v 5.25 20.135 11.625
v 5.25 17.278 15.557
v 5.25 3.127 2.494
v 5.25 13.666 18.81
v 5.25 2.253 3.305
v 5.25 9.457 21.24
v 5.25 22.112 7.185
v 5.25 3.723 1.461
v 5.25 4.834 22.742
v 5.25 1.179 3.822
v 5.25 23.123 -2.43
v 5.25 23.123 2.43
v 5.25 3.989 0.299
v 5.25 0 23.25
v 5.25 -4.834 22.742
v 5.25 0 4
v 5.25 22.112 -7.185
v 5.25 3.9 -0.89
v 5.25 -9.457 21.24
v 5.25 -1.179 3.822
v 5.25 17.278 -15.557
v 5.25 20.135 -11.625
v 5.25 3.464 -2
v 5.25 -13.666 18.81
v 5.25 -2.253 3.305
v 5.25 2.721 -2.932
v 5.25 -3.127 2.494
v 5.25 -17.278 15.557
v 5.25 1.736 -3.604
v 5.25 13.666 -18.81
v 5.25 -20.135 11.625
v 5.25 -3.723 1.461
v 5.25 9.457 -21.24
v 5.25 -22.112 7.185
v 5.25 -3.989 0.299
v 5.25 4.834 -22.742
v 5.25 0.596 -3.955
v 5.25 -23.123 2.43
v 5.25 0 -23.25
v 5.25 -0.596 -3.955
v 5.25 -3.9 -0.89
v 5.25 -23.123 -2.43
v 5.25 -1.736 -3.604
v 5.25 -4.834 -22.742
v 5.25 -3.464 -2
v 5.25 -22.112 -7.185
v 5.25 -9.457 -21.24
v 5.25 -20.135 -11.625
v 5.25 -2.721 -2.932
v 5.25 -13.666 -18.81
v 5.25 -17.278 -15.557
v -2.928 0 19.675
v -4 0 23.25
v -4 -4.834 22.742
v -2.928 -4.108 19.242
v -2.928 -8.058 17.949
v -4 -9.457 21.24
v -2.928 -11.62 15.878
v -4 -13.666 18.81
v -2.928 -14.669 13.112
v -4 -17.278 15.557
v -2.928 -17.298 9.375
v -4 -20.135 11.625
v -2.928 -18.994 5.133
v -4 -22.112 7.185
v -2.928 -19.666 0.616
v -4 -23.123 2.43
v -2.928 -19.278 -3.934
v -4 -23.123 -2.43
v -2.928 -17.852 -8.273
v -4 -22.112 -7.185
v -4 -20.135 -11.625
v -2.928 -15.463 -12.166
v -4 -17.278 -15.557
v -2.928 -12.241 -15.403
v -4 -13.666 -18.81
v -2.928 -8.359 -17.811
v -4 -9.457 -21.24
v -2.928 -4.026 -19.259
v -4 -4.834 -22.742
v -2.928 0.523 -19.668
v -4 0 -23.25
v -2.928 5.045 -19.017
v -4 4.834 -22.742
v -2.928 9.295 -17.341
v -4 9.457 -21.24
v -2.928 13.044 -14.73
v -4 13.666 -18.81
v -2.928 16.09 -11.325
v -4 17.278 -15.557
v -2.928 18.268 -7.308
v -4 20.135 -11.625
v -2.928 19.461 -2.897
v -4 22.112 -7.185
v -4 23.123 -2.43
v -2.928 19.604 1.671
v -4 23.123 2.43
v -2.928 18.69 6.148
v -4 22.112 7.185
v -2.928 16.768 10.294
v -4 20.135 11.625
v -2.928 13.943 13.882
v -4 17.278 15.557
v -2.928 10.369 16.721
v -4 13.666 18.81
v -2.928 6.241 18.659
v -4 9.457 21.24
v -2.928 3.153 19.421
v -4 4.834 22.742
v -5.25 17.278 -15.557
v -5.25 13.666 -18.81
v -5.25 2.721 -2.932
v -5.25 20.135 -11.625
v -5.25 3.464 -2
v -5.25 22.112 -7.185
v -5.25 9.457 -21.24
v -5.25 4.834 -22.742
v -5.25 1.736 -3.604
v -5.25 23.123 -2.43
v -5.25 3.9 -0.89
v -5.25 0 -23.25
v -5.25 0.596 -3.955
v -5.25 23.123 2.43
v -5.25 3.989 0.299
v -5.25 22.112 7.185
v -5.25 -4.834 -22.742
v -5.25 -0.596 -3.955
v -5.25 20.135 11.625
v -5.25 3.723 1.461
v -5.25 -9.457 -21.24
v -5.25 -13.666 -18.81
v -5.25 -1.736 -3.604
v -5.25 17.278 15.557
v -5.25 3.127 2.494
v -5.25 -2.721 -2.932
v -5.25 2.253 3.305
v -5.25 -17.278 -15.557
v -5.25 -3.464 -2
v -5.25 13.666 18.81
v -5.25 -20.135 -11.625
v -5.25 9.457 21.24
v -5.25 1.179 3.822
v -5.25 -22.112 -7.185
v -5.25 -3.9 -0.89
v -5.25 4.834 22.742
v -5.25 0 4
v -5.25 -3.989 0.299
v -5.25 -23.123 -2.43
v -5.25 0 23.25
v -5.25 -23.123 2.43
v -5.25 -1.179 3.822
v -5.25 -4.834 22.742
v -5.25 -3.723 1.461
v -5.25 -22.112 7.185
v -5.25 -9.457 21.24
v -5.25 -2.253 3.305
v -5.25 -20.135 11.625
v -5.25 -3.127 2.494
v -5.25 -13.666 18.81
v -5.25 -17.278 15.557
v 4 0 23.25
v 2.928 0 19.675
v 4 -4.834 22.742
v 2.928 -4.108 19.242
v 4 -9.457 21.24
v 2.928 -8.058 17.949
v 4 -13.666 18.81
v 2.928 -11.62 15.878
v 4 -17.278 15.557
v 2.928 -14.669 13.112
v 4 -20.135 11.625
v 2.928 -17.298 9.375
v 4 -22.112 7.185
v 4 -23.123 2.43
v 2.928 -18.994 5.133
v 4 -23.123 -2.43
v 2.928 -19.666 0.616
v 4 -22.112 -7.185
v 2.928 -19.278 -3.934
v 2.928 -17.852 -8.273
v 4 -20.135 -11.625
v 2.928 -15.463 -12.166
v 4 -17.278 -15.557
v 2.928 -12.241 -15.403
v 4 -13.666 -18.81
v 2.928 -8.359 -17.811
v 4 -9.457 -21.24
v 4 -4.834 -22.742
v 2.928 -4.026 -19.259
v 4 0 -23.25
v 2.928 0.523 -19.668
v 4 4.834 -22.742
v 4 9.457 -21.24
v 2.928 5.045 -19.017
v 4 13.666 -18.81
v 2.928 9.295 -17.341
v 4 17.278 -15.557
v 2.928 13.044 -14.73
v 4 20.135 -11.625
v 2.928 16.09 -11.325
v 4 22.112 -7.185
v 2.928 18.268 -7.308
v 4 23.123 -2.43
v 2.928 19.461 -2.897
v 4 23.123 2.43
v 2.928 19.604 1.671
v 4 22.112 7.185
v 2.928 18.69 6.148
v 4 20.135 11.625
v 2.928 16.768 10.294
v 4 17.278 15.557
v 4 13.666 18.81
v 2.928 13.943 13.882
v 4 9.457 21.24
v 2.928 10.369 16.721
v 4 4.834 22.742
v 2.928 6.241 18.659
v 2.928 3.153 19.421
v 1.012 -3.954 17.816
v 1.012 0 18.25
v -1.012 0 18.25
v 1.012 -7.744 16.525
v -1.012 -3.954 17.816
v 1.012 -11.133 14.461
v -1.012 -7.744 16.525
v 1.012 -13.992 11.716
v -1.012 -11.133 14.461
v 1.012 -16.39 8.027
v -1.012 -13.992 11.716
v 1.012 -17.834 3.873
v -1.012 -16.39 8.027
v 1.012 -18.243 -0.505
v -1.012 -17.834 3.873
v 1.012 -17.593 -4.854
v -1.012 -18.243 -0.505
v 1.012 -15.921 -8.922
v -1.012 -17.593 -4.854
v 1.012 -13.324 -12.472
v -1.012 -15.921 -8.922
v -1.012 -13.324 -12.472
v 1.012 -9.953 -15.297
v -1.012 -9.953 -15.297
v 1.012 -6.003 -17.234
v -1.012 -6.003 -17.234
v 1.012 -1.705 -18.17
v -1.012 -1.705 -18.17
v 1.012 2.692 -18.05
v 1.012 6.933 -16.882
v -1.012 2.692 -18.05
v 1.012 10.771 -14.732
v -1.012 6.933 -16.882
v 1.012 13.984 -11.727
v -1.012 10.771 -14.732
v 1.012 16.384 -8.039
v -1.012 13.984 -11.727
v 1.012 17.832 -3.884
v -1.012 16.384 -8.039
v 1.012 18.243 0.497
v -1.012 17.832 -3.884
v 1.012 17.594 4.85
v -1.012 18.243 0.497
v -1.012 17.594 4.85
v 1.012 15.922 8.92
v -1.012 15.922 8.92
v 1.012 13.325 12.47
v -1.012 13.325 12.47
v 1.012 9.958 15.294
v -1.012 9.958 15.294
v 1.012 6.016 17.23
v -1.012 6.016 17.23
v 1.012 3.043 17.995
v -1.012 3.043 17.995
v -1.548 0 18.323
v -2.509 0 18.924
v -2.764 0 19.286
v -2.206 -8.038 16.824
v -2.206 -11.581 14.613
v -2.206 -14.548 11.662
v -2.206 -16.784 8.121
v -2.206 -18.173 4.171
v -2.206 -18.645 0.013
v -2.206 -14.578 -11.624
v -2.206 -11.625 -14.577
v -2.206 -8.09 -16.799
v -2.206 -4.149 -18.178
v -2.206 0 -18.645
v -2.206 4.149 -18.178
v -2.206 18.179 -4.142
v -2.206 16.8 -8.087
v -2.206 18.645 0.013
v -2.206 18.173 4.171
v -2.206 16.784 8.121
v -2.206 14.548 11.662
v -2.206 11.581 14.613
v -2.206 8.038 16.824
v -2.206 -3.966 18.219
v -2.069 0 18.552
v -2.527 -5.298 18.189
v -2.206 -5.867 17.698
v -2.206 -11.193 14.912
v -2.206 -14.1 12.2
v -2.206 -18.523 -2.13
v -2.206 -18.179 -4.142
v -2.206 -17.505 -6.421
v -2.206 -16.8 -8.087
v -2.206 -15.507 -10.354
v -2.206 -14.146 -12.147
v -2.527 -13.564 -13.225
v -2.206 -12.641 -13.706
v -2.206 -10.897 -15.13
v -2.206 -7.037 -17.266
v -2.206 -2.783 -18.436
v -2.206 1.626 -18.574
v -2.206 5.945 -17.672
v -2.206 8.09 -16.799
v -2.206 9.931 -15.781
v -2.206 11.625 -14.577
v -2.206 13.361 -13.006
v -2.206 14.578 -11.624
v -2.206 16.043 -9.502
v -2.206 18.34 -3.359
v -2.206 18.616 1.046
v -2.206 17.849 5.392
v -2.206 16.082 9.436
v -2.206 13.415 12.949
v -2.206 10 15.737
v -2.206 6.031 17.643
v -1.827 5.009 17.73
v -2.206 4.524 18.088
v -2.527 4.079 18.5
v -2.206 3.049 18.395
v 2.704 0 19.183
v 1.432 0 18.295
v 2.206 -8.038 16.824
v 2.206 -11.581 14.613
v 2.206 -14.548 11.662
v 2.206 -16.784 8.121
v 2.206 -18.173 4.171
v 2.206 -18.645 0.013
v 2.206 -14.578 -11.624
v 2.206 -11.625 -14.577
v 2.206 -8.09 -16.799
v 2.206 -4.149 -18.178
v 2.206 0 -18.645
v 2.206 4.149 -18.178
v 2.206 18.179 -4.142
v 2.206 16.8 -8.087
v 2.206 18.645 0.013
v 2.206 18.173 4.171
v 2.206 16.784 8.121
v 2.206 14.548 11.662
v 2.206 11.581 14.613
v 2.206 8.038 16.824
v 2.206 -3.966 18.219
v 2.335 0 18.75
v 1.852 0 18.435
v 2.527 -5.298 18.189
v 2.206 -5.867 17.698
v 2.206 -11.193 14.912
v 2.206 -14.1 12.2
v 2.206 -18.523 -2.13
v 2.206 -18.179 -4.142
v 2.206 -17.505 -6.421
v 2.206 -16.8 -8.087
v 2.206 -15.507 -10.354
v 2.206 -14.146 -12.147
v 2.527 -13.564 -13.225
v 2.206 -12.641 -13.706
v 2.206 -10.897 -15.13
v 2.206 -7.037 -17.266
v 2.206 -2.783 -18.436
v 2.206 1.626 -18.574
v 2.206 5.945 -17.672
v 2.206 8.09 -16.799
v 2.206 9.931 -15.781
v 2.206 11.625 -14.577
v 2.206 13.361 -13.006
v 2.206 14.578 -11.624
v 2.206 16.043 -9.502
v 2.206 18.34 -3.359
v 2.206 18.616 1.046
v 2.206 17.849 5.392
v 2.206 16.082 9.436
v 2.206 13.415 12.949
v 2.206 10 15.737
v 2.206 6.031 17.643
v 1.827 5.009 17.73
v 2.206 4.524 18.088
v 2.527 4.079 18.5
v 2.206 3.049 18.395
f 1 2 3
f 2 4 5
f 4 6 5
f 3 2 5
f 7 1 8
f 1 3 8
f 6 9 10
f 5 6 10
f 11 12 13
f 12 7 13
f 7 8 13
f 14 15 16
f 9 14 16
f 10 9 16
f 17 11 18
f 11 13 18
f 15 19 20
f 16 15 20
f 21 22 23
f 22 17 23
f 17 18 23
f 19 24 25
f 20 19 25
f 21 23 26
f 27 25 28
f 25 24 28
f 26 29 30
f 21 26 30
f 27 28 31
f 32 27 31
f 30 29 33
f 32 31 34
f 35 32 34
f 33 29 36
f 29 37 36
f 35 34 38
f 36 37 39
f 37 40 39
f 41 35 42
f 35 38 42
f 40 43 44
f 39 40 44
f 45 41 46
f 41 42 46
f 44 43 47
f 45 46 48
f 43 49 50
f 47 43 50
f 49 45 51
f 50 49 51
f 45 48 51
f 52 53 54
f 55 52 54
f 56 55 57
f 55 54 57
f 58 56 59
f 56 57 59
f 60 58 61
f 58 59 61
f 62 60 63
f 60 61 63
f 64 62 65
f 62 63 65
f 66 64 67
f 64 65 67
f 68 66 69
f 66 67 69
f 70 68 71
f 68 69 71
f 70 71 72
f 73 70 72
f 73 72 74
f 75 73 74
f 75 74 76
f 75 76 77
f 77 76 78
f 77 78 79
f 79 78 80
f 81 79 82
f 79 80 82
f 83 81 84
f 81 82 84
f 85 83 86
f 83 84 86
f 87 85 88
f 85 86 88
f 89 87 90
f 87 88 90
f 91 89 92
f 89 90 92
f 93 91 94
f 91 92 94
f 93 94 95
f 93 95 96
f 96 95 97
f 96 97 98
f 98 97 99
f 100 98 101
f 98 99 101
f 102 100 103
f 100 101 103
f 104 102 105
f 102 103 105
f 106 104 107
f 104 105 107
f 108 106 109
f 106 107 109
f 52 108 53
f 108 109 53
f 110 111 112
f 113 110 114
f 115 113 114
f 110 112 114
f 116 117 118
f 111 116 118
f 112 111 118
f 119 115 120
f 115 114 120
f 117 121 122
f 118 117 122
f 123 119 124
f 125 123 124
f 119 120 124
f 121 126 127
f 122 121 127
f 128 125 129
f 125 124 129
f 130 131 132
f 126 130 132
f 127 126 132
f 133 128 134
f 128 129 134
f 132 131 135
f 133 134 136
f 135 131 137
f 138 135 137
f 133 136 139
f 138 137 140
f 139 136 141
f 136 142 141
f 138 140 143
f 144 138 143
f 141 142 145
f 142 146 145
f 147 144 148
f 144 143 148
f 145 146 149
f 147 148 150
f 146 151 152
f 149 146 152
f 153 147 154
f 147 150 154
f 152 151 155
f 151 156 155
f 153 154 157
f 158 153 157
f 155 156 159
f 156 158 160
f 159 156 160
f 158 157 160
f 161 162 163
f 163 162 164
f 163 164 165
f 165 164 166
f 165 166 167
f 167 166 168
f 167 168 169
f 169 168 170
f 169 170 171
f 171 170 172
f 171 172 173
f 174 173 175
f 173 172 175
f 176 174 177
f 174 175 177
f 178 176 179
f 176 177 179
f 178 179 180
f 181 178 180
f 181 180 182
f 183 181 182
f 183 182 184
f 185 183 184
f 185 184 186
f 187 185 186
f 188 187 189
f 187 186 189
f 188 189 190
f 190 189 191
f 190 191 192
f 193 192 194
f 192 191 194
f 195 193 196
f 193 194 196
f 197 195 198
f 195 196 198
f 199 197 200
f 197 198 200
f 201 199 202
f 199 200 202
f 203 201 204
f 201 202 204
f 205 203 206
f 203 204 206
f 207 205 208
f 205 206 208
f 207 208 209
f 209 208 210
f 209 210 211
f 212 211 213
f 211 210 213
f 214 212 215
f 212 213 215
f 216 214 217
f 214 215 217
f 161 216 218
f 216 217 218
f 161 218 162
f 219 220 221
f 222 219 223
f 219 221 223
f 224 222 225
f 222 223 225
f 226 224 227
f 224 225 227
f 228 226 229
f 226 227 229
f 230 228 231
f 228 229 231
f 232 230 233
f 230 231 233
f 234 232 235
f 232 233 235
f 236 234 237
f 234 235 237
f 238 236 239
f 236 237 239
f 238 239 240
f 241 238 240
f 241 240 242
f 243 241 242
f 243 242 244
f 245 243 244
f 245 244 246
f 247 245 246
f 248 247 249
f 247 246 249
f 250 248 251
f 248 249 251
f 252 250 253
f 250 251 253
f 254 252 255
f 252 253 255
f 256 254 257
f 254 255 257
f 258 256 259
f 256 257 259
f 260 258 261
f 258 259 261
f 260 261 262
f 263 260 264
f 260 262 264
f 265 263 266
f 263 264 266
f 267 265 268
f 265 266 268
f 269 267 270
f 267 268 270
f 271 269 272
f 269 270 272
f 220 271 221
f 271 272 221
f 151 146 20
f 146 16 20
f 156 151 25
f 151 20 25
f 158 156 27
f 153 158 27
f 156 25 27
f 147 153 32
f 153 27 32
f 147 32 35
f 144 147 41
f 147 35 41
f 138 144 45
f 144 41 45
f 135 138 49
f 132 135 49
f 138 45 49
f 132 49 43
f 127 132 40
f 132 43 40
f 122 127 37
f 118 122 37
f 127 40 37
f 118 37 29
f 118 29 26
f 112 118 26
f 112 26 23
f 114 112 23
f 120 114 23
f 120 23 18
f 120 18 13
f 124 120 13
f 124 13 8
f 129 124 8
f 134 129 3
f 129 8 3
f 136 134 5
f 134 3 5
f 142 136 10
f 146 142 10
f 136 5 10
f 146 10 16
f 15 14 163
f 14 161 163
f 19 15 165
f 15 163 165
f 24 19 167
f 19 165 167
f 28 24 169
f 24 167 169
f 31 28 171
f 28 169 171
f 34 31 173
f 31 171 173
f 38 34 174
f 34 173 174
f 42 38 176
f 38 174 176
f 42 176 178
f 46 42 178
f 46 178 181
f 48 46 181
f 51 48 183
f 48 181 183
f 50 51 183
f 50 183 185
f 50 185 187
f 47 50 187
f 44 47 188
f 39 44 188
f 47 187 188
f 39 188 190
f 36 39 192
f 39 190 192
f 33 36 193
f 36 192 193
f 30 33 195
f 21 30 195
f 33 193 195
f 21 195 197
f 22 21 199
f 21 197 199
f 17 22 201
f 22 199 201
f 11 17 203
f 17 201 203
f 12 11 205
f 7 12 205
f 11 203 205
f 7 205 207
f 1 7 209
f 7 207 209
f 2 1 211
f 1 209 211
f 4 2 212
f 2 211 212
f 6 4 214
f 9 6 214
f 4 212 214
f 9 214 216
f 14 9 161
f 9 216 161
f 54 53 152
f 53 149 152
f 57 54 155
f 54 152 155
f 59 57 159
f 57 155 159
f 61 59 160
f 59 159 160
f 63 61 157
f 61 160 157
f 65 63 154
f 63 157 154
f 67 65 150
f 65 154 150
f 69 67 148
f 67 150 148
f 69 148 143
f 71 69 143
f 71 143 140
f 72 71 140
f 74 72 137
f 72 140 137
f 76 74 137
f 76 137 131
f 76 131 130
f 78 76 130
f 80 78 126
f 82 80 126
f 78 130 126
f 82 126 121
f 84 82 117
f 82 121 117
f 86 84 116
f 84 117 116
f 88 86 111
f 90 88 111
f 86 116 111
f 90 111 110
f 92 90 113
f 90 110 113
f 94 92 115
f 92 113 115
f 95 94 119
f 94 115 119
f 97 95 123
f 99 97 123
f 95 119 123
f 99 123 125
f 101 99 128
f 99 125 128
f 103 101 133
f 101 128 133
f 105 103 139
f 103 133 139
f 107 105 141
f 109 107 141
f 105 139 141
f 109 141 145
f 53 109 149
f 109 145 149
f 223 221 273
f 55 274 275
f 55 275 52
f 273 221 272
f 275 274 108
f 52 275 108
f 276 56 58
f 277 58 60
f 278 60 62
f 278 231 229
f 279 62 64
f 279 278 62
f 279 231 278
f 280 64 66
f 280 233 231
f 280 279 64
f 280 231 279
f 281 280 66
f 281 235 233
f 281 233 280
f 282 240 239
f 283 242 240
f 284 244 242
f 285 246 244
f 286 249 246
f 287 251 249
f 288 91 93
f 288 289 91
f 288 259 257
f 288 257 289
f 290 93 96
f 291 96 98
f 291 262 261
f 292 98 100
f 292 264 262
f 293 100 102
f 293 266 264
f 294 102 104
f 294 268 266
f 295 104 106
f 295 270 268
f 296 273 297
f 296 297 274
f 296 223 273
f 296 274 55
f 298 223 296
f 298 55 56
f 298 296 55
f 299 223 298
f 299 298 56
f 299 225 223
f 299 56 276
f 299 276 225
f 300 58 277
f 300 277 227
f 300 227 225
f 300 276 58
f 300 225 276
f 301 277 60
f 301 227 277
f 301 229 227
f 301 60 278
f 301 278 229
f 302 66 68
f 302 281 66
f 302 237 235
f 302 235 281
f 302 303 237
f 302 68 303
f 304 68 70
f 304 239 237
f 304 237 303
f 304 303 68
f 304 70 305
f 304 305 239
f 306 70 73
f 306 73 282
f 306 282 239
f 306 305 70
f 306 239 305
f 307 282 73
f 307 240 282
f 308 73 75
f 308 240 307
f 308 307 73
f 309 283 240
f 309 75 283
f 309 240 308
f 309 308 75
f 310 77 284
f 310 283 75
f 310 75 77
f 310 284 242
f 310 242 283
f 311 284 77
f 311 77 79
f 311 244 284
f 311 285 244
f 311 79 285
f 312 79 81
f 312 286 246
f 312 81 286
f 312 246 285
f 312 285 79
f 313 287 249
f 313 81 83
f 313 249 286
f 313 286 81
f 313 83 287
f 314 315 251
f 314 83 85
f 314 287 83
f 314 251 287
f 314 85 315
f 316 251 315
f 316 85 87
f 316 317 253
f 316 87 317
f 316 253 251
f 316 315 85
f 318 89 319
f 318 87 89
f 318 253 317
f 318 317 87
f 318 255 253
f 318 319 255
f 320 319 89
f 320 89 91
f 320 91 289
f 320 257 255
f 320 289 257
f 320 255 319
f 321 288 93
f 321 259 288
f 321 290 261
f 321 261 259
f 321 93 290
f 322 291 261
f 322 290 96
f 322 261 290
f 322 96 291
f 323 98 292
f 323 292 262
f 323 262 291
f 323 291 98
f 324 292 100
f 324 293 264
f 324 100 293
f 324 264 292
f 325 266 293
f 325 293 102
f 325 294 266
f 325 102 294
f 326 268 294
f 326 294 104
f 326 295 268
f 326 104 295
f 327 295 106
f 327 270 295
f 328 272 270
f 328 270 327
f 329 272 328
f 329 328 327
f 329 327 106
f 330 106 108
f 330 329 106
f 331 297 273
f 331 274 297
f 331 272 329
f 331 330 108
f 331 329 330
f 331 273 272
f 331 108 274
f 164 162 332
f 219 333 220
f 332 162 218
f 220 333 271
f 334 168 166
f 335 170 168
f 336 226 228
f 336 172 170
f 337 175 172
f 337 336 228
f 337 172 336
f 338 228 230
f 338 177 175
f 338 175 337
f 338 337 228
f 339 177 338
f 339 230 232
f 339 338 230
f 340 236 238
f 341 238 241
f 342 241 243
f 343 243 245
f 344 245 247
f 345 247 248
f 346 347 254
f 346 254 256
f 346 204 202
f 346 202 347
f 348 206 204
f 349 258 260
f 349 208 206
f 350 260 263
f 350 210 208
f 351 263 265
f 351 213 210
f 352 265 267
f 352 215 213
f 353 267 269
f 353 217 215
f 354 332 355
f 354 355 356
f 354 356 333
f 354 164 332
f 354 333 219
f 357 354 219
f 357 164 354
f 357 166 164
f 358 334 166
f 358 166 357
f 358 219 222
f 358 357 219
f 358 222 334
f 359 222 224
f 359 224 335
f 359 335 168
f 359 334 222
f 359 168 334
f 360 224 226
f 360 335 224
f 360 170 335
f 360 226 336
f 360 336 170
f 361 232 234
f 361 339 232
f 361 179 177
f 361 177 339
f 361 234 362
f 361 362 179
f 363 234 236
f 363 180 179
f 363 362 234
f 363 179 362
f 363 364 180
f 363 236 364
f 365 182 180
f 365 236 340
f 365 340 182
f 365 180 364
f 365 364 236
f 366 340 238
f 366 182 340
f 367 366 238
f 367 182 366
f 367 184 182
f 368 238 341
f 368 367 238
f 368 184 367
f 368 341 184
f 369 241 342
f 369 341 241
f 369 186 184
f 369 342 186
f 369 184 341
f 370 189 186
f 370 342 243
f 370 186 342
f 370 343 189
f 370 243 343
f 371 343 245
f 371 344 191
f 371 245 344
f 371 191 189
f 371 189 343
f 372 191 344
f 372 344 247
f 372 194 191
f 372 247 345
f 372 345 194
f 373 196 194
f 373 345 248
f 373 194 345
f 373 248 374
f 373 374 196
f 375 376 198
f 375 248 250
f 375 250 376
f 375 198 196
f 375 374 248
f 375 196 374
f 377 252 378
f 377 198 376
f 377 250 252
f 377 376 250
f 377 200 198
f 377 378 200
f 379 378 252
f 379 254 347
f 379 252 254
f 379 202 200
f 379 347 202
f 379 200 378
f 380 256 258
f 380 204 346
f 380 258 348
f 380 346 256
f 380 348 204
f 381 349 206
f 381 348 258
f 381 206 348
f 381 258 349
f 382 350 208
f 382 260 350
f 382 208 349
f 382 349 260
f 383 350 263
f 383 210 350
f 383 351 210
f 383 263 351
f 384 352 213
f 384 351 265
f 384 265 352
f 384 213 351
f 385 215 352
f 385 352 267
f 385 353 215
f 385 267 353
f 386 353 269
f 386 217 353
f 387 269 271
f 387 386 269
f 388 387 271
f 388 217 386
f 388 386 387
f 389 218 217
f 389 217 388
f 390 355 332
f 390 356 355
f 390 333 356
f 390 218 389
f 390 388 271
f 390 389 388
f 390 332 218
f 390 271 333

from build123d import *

# Parameters (mm, degrees)
F2_R = 2
F3_R = 2


with BuildPart() as f1:
    # F0 (on Front) → F1 (revolve)
    with BuildSketch(Plane.XZ):
        Polygon((0, 18.25), (0, 4), (5.25, 4), (5.25, 23.25), (4, 23.25), (2.5, 18.25), align=None)
        Polygon((-5.25, 4), (0, 4), (0, 18.25), (-2.5, 18.25), (-4, 23.25), (-5.25, 23.25), align=None)
    revolve(axis=Axis((0.717638, 0, 0), (1, 0, 0)))

    # F2
    f2_edges = [f1.edges().sort_by_distance(p)[0] for p in [
        (2.5, 0, -18.25),
    ]]
    fillet(f2_edges, radius=F2_R)

    # F3
    f3_edges = [f1.edges().sort_by_distance(p)[0] for p in [
        (-2.5, 0, -18.25),
    ]]
    fillet(f3_edges, radius=F3_R)


solid = f1.part
